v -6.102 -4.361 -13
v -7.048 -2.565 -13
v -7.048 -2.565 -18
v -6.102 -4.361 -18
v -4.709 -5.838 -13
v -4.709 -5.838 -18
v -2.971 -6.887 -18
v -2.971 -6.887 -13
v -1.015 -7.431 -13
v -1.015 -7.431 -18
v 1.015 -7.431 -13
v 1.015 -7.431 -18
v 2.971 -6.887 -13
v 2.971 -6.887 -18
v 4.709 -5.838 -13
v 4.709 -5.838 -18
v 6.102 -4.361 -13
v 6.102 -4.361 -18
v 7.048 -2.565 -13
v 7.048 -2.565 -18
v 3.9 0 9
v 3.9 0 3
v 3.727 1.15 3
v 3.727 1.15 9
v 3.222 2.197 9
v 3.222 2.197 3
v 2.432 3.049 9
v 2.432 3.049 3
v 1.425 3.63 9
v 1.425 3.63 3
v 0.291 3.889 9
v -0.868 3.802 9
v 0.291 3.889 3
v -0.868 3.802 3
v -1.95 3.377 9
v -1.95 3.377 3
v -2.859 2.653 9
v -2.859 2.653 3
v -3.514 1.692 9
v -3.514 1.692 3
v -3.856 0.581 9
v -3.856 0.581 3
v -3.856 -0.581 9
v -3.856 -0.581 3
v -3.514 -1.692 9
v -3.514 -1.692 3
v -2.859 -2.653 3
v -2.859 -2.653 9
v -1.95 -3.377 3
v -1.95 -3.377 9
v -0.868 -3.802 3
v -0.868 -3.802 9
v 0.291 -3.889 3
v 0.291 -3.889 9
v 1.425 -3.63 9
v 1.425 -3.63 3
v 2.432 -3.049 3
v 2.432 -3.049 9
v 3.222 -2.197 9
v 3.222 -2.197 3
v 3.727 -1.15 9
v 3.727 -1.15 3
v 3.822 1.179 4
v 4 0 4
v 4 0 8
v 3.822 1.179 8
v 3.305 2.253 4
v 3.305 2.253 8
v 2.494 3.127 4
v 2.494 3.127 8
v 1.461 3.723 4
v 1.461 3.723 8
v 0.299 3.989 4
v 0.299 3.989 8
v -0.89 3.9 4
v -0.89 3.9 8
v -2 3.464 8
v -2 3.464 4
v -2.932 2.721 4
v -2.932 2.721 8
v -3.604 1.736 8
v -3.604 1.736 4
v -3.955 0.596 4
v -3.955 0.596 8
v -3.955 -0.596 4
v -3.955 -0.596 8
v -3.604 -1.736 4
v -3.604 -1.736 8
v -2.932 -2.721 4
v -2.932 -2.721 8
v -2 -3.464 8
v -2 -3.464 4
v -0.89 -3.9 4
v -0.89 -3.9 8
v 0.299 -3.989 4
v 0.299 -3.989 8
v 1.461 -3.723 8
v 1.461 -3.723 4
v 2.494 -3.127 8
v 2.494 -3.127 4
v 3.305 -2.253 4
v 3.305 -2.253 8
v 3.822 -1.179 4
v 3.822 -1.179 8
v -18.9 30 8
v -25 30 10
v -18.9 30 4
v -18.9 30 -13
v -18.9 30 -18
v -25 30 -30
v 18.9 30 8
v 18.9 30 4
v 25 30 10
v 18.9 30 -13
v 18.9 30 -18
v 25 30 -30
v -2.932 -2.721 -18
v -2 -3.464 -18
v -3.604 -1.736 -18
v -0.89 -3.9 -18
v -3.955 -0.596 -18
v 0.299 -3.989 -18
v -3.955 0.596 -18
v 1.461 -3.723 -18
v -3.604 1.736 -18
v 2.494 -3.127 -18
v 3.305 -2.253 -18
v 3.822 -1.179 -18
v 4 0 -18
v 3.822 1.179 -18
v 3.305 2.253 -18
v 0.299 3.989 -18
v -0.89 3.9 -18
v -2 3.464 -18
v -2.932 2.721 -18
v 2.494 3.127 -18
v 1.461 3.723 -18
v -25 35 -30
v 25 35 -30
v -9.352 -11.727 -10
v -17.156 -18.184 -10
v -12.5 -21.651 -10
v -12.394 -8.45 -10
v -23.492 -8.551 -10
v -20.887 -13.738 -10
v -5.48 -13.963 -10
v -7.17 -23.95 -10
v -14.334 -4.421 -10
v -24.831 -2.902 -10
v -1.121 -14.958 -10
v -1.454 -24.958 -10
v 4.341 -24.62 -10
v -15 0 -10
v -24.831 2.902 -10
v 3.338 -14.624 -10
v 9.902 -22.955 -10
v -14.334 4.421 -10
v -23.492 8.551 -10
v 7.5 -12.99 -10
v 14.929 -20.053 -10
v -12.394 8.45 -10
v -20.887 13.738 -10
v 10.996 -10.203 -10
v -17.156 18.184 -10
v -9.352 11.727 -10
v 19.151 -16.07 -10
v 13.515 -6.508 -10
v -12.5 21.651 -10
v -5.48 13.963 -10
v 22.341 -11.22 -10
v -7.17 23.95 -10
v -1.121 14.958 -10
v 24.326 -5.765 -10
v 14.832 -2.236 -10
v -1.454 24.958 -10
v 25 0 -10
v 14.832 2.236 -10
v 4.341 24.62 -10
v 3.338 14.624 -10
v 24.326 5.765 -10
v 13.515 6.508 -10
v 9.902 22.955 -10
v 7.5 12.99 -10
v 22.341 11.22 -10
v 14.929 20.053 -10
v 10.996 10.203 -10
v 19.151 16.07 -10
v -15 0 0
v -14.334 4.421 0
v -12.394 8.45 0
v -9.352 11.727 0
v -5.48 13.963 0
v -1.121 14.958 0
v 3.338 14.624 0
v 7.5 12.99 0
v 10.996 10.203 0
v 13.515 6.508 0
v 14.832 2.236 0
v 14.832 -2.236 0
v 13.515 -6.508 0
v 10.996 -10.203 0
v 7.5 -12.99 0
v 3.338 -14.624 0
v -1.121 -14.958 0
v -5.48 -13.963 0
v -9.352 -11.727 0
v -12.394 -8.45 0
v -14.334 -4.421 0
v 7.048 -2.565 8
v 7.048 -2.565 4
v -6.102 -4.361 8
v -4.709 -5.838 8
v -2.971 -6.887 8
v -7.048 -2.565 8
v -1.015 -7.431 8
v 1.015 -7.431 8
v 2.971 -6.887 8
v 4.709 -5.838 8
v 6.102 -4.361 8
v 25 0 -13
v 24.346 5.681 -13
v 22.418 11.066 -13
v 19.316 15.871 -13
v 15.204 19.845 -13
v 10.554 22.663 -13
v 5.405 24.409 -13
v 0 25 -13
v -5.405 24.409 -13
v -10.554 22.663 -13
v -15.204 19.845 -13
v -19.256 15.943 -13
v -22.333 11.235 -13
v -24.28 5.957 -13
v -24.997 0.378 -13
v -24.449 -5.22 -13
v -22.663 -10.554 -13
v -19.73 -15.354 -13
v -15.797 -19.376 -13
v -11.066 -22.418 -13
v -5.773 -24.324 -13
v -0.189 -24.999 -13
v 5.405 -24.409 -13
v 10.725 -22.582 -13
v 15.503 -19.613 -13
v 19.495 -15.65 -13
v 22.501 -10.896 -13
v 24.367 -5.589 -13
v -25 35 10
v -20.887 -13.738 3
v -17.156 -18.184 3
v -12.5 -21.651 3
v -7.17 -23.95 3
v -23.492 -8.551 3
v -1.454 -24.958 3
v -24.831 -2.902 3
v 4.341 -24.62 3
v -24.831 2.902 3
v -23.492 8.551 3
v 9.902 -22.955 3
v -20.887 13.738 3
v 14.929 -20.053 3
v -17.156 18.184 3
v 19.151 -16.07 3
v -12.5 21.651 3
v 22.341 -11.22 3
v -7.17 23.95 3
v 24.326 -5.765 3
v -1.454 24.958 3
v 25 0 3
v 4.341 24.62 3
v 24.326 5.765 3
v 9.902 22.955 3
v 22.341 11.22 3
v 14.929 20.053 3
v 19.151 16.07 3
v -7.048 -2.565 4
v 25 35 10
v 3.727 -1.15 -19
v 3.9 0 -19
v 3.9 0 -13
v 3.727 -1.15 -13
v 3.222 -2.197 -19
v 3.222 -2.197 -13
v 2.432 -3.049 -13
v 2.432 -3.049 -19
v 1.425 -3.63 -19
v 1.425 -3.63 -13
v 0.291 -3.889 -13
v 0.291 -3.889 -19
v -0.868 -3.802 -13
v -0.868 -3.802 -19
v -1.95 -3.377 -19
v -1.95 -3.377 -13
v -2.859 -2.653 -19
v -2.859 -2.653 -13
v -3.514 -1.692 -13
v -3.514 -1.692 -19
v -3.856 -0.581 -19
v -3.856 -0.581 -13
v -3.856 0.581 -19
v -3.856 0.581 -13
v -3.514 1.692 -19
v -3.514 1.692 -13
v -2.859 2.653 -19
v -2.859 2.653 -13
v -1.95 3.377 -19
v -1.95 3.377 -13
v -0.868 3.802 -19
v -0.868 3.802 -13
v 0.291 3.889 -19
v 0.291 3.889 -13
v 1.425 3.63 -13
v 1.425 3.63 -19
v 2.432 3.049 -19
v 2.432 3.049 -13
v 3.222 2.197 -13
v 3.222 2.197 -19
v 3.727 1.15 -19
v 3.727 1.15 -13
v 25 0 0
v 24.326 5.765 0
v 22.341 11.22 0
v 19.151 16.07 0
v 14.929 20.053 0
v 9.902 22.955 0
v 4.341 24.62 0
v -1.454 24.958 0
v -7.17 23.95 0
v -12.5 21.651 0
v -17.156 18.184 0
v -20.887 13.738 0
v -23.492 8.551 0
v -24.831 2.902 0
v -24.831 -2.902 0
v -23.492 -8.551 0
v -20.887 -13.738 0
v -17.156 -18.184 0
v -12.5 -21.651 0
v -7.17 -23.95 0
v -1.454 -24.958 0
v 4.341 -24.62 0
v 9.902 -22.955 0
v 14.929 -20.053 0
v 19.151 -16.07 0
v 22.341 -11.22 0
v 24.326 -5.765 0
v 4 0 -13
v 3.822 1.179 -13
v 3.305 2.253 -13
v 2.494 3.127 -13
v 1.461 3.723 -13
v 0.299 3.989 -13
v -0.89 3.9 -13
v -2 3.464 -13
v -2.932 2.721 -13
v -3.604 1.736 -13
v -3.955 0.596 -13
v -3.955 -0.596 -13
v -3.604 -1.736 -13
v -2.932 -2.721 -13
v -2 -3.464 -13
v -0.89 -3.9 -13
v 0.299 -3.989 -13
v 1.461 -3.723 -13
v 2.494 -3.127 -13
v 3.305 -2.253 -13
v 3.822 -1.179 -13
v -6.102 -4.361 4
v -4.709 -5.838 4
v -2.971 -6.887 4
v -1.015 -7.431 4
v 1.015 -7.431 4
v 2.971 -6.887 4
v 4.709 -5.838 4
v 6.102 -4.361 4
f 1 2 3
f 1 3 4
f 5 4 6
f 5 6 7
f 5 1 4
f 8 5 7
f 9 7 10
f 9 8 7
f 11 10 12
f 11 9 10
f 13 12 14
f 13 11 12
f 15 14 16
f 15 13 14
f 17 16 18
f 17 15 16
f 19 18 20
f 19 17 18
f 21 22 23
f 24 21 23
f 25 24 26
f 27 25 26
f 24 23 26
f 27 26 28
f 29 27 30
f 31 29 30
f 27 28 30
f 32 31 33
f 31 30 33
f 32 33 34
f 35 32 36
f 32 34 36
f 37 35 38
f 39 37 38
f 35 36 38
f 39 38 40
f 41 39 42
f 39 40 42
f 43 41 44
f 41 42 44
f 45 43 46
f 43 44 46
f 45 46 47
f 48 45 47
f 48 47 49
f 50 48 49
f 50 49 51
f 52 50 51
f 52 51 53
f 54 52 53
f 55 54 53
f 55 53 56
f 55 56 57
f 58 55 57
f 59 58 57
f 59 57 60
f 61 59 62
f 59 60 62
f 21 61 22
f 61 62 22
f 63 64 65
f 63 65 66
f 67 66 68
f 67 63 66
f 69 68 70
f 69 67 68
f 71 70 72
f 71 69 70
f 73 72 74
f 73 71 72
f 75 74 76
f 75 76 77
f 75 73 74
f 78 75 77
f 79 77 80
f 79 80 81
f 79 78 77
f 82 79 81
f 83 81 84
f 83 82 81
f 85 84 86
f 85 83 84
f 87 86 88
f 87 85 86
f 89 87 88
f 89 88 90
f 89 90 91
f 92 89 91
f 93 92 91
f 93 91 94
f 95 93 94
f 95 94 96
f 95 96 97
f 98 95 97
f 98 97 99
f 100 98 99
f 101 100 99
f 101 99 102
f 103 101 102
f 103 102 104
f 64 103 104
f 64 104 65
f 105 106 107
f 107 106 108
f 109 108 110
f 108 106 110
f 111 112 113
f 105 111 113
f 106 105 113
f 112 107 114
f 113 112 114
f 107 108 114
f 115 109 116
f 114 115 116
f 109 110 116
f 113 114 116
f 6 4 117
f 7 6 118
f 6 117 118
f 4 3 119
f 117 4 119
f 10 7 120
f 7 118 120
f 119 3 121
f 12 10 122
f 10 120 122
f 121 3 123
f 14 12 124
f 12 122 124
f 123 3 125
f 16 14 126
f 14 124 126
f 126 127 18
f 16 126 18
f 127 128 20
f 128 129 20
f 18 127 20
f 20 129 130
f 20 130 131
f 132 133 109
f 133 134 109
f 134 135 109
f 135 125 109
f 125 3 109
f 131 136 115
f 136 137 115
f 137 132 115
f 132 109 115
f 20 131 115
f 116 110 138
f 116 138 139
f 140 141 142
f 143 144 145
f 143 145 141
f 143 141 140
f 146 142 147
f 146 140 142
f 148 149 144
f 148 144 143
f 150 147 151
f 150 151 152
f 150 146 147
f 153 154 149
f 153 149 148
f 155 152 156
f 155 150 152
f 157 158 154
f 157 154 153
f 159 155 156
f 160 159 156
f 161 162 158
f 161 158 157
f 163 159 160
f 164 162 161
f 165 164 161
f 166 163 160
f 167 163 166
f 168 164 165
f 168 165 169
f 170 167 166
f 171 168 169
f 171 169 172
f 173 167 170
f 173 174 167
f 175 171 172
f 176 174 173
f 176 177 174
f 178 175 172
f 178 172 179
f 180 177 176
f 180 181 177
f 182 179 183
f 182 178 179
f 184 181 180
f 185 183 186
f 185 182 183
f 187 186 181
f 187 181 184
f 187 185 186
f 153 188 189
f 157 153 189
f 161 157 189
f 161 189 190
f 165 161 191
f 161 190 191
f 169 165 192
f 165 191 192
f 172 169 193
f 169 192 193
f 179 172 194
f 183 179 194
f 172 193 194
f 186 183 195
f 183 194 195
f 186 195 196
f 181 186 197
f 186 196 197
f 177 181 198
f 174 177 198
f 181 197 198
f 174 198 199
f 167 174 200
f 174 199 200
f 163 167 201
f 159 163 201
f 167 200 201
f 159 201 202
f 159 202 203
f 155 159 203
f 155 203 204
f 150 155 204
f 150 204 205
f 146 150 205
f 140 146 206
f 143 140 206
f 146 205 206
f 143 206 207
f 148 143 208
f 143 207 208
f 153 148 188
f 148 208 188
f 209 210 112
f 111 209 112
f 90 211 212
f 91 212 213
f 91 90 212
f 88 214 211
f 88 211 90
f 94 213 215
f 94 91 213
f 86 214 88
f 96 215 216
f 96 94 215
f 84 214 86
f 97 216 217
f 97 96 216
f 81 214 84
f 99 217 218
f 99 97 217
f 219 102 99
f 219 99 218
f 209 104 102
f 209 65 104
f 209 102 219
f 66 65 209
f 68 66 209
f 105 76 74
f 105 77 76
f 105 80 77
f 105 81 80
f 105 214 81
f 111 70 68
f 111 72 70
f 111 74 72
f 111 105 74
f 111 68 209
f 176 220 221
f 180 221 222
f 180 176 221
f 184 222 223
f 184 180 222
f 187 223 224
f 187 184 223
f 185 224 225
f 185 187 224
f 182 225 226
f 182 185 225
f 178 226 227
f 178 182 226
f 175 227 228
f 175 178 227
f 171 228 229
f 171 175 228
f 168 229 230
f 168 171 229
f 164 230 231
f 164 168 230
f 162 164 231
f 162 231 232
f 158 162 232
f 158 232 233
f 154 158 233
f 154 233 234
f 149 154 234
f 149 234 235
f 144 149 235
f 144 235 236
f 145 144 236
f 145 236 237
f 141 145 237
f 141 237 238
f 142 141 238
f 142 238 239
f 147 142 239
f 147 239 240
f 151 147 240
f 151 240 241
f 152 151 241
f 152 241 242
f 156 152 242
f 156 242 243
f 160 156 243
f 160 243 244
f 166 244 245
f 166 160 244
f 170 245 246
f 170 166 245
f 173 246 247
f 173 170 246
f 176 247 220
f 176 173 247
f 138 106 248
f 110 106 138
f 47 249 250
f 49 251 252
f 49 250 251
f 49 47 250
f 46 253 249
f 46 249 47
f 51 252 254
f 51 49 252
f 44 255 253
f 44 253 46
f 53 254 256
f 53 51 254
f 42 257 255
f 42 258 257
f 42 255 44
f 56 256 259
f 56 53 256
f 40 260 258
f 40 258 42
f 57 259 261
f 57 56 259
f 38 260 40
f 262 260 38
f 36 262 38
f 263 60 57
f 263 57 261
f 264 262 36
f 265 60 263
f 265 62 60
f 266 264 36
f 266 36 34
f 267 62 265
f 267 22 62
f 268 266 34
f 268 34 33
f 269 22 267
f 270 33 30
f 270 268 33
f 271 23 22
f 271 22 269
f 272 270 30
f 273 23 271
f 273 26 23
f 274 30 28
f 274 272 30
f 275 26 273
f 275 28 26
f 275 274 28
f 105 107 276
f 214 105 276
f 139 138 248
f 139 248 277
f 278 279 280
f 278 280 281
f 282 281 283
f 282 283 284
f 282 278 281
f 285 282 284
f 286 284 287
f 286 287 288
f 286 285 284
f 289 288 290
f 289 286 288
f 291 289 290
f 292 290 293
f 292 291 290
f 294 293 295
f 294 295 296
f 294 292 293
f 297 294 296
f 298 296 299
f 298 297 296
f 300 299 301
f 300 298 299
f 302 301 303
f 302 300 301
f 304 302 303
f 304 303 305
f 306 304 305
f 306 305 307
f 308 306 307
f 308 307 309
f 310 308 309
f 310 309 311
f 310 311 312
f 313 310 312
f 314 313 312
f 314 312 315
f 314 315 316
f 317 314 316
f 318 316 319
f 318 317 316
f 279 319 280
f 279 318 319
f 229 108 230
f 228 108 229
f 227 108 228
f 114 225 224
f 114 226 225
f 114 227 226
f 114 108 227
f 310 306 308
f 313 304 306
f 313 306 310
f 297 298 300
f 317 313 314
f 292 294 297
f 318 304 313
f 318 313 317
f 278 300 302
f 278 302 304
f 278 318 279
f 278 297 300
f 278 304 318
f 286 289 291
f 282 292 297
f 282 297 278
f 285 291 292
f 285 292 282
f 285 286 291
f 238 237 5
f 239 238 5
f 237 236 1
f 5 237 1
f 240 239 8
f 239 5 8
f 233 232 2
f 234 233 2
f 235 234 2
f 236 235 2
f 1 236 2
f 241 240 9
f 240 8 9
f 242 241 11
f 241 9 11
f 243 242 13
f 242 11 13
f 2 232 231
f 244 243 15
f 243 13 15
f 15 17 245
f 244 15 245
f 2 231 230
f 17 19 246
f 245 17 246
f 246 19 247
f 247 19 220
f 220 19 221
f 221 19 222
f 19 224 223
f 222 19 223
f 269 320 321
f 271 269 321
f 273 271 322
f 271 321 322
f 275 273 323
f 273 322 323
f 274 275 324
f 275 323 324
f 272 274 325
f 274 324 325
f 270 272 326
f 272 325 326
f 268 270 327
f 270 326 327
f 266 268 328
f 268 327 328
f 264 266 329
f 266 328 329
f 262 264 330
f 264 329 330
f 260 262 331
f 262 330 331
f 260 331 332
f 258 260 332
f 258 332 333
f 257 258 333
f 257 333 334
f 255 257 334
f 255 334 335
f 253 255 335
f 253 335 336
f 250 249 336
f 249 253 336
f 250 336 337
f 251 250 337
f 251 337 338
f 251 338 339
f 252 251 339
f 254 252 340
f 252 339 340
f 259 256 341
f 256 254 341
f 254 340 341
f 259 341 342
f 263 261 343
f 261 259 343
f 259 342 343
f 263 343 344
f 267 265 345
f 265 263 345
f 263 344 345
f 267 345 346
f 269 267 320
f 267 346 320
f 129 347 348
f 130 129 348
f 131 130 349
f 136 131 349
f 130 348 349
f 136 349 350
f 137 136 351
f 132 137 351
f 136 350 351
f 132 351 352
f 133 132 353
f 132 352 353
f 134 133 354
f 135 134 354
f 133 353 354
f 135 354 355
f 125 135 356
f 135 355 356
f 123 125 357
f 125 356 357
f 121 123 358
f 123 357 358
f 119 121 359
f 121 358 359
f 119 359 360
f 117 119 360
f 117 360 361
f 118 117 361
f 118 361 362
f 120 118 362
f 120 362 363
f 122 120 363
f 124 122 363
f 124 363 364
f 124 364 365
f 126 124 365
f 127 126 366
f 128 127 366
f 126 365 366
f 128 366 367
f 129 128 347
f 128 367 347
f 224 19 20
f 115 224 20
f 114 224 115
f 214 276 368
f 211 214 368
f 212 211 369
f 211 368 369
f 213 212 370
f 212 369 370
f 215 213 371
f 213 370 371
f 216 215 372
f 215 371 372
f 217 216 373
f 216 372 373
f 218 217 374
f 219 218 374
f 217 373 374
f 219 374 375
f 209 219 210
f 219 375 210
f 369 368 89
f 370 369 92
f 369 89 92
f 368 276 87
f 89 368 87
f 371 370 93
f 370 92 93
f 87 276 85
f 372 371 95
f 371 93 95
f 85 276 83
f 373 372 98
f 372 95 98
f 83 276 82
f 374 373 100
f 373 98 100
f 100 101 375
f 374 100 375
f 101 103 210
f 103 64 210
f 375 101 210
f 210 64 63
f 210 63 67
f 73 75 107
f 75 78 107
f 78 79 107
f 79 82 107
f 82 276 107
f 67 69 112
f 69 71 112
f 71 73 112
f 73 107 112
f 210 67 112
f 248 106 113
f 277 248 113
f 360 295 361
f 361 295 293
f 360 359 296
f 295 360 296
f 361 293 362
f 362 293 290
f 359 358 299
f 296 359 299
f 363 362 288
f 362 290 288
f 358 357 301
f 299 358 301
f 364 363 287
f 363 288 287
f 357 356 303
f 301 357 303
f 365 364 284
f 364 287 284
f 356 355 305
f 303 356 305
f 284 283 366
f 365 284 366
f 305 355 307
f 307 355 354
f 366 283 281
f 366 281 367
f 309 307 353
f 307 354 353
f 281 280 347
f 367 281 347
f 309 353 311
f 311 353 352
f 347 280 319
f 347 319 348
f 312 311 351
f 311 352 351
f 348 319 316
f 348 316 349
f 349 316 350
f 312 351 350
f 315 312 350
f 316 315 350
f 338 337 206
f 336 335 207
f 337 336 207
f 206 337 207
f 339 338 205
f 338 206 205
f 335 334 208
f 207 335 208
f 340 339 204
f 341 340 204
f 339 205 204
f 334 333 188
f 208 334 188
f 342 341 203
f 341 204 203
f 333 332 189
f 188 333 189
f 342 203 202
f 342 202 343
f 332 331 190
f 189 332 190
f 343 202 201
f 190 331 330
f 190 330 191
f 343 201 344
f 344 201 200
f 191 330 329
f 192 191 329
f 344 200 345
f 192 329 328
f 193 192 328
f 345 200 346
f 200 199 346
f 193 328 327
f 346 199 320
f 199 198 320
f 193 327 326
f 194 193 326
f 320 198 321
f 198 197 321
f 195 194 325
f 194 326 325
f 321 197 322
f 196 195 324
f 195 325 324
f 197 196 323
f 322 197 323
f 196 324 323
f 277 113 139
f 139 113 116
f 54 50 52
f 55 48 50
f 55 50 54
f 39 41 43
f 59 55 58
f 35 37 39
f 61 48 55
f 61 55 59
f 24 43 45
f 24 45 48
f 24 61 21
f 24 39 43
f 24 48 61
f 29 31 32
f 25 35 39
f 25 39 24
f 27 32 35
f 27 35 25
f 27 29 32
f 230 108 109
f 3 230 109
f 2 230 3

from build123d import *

# Parameters (mm, degrees)
SKETCH_1_R          = 25
EXTRUDE_1_DEPTH     = 3
SKETCH_2_R          = 4
EXTRUDE_2_DEPTH     = 5
SKETCH_3_R          = 3.9
EXTRUDE_4_DEPTH     = 6
SKETCH_5_R          = 15
EXTRUDE_5_DEPTH     = 10
EXTRUDE_START       = 6
SKETCH_6_R          = 3.9
EXTRUDE_6_DEPTH     = 6
SKETCH_8_W          = 50
SKETCH_8_H          = 40
EXTRUDE_7_DEPTH     = 5
SKETCH_2_3_R        = 4
CUT_EXTRUDE_1_DEPTH = 1


with BuildPart() as part:
    # 草图1 → 凸台-拉伸1 (new body)
    with BuildSketch(Plane.XY):
        Circle(SKETCH_1_R)
    extrude_1 = extrude(amount=EXTRUDE_1_DEPTH)

    # 草图2 → 凸台-拉伸2 (add)
    with BuildSketch(Plane.XY.offset(3)):
        with BuildLine():
            Line((-18.900440322, 30), (-7.047694656, -2.565151075))
            ThreePointArc((-7.047694656, -2.565151075), (0, -7.5), (7.047694656, -2.565151075))
            Line((7.047694656, -2.565151075), (18.900440322, 30))
            Line((18.900440322, 30), (-18.900440322, 30))
        make_face()
        Circle(SKETCH_2_R, mode=Mode.SUBTRACT)
    extrude_2 = extrude(amount=EXTRUDE_2_DEPTH)

    # 草图3 → 凸台-拉伸4 (add)
    with BuildSketch(Plane.XY.offset(3)):
        Circle(SKETCH_3_R)
    extrude(amount=EXTRUDE_4_DEPTH)

    # 草图5 → 凸台-拉伸5 (add)
    with BuildSketch(Plane(origin=(0, 0, 0), x_dir=(-1, 0, 0), z_dir=(0, 0, -1))):
        Circle(SKETCH_5_R)
    extrude(amount=EXTRUDE_5_DEPTH)

    # 镜向1: 凸台-拉伸1, 凸台-拉伸2 across plane
    add(extrude_1.mirror(Plane.XY.offset(-5)))
    add(extrude_2.mirror(Plane.XY.offset(-5)))

    # 草图6 → 凸台-拉伸6 (add)
    with BuildSketch(Plane(origin=(0, 0, -13), x_dir=(-1, 0, 0), z_dir=(0, 0, -1)).offset(EXTRUDE_START)):
        Circle(SKETCH_6_R)
    extrude(amount=-EXTRUDE_6_DEPTH)

    # 草图8 → 凸台-拉伸7 (add)
    with BuildSketch(Plane(origin=(0, 30, 0), x_dir=(1, 0, 0), z_dir=(0, 1, 0))):
        with Locations((0, 10)):
            Rectangle(SKETCH_8_W, SKETCH_8_H)
    extrude(amount=EXTRUDE_7_DEPTH)

    # 草图2<3> → 切除-拉伸1 (cut)
    with BuildSketch(Plane.XY.offset(3)):
        with BuildLine():
            Line((-18.900440322, 30), (-7.047694656, -2.565151075))
            ThreePointArc((-7.047694656, -2.565151075), (0, -7.5), (7.047694656, -2.565151075))
            Line((7.047694656, -2.565151075), (18.900440322, 30))
            Line((18.900440322, 30), (-18.900440322, 30))
        make_face()
        Circle(SKETCH_2_3_R, mode=Mode.SUBTRACT)
    extrude(amount=CUT_EXTRUDE_1_DEPTH, mode=Mode.SUBTRACT)


solid = part.part
